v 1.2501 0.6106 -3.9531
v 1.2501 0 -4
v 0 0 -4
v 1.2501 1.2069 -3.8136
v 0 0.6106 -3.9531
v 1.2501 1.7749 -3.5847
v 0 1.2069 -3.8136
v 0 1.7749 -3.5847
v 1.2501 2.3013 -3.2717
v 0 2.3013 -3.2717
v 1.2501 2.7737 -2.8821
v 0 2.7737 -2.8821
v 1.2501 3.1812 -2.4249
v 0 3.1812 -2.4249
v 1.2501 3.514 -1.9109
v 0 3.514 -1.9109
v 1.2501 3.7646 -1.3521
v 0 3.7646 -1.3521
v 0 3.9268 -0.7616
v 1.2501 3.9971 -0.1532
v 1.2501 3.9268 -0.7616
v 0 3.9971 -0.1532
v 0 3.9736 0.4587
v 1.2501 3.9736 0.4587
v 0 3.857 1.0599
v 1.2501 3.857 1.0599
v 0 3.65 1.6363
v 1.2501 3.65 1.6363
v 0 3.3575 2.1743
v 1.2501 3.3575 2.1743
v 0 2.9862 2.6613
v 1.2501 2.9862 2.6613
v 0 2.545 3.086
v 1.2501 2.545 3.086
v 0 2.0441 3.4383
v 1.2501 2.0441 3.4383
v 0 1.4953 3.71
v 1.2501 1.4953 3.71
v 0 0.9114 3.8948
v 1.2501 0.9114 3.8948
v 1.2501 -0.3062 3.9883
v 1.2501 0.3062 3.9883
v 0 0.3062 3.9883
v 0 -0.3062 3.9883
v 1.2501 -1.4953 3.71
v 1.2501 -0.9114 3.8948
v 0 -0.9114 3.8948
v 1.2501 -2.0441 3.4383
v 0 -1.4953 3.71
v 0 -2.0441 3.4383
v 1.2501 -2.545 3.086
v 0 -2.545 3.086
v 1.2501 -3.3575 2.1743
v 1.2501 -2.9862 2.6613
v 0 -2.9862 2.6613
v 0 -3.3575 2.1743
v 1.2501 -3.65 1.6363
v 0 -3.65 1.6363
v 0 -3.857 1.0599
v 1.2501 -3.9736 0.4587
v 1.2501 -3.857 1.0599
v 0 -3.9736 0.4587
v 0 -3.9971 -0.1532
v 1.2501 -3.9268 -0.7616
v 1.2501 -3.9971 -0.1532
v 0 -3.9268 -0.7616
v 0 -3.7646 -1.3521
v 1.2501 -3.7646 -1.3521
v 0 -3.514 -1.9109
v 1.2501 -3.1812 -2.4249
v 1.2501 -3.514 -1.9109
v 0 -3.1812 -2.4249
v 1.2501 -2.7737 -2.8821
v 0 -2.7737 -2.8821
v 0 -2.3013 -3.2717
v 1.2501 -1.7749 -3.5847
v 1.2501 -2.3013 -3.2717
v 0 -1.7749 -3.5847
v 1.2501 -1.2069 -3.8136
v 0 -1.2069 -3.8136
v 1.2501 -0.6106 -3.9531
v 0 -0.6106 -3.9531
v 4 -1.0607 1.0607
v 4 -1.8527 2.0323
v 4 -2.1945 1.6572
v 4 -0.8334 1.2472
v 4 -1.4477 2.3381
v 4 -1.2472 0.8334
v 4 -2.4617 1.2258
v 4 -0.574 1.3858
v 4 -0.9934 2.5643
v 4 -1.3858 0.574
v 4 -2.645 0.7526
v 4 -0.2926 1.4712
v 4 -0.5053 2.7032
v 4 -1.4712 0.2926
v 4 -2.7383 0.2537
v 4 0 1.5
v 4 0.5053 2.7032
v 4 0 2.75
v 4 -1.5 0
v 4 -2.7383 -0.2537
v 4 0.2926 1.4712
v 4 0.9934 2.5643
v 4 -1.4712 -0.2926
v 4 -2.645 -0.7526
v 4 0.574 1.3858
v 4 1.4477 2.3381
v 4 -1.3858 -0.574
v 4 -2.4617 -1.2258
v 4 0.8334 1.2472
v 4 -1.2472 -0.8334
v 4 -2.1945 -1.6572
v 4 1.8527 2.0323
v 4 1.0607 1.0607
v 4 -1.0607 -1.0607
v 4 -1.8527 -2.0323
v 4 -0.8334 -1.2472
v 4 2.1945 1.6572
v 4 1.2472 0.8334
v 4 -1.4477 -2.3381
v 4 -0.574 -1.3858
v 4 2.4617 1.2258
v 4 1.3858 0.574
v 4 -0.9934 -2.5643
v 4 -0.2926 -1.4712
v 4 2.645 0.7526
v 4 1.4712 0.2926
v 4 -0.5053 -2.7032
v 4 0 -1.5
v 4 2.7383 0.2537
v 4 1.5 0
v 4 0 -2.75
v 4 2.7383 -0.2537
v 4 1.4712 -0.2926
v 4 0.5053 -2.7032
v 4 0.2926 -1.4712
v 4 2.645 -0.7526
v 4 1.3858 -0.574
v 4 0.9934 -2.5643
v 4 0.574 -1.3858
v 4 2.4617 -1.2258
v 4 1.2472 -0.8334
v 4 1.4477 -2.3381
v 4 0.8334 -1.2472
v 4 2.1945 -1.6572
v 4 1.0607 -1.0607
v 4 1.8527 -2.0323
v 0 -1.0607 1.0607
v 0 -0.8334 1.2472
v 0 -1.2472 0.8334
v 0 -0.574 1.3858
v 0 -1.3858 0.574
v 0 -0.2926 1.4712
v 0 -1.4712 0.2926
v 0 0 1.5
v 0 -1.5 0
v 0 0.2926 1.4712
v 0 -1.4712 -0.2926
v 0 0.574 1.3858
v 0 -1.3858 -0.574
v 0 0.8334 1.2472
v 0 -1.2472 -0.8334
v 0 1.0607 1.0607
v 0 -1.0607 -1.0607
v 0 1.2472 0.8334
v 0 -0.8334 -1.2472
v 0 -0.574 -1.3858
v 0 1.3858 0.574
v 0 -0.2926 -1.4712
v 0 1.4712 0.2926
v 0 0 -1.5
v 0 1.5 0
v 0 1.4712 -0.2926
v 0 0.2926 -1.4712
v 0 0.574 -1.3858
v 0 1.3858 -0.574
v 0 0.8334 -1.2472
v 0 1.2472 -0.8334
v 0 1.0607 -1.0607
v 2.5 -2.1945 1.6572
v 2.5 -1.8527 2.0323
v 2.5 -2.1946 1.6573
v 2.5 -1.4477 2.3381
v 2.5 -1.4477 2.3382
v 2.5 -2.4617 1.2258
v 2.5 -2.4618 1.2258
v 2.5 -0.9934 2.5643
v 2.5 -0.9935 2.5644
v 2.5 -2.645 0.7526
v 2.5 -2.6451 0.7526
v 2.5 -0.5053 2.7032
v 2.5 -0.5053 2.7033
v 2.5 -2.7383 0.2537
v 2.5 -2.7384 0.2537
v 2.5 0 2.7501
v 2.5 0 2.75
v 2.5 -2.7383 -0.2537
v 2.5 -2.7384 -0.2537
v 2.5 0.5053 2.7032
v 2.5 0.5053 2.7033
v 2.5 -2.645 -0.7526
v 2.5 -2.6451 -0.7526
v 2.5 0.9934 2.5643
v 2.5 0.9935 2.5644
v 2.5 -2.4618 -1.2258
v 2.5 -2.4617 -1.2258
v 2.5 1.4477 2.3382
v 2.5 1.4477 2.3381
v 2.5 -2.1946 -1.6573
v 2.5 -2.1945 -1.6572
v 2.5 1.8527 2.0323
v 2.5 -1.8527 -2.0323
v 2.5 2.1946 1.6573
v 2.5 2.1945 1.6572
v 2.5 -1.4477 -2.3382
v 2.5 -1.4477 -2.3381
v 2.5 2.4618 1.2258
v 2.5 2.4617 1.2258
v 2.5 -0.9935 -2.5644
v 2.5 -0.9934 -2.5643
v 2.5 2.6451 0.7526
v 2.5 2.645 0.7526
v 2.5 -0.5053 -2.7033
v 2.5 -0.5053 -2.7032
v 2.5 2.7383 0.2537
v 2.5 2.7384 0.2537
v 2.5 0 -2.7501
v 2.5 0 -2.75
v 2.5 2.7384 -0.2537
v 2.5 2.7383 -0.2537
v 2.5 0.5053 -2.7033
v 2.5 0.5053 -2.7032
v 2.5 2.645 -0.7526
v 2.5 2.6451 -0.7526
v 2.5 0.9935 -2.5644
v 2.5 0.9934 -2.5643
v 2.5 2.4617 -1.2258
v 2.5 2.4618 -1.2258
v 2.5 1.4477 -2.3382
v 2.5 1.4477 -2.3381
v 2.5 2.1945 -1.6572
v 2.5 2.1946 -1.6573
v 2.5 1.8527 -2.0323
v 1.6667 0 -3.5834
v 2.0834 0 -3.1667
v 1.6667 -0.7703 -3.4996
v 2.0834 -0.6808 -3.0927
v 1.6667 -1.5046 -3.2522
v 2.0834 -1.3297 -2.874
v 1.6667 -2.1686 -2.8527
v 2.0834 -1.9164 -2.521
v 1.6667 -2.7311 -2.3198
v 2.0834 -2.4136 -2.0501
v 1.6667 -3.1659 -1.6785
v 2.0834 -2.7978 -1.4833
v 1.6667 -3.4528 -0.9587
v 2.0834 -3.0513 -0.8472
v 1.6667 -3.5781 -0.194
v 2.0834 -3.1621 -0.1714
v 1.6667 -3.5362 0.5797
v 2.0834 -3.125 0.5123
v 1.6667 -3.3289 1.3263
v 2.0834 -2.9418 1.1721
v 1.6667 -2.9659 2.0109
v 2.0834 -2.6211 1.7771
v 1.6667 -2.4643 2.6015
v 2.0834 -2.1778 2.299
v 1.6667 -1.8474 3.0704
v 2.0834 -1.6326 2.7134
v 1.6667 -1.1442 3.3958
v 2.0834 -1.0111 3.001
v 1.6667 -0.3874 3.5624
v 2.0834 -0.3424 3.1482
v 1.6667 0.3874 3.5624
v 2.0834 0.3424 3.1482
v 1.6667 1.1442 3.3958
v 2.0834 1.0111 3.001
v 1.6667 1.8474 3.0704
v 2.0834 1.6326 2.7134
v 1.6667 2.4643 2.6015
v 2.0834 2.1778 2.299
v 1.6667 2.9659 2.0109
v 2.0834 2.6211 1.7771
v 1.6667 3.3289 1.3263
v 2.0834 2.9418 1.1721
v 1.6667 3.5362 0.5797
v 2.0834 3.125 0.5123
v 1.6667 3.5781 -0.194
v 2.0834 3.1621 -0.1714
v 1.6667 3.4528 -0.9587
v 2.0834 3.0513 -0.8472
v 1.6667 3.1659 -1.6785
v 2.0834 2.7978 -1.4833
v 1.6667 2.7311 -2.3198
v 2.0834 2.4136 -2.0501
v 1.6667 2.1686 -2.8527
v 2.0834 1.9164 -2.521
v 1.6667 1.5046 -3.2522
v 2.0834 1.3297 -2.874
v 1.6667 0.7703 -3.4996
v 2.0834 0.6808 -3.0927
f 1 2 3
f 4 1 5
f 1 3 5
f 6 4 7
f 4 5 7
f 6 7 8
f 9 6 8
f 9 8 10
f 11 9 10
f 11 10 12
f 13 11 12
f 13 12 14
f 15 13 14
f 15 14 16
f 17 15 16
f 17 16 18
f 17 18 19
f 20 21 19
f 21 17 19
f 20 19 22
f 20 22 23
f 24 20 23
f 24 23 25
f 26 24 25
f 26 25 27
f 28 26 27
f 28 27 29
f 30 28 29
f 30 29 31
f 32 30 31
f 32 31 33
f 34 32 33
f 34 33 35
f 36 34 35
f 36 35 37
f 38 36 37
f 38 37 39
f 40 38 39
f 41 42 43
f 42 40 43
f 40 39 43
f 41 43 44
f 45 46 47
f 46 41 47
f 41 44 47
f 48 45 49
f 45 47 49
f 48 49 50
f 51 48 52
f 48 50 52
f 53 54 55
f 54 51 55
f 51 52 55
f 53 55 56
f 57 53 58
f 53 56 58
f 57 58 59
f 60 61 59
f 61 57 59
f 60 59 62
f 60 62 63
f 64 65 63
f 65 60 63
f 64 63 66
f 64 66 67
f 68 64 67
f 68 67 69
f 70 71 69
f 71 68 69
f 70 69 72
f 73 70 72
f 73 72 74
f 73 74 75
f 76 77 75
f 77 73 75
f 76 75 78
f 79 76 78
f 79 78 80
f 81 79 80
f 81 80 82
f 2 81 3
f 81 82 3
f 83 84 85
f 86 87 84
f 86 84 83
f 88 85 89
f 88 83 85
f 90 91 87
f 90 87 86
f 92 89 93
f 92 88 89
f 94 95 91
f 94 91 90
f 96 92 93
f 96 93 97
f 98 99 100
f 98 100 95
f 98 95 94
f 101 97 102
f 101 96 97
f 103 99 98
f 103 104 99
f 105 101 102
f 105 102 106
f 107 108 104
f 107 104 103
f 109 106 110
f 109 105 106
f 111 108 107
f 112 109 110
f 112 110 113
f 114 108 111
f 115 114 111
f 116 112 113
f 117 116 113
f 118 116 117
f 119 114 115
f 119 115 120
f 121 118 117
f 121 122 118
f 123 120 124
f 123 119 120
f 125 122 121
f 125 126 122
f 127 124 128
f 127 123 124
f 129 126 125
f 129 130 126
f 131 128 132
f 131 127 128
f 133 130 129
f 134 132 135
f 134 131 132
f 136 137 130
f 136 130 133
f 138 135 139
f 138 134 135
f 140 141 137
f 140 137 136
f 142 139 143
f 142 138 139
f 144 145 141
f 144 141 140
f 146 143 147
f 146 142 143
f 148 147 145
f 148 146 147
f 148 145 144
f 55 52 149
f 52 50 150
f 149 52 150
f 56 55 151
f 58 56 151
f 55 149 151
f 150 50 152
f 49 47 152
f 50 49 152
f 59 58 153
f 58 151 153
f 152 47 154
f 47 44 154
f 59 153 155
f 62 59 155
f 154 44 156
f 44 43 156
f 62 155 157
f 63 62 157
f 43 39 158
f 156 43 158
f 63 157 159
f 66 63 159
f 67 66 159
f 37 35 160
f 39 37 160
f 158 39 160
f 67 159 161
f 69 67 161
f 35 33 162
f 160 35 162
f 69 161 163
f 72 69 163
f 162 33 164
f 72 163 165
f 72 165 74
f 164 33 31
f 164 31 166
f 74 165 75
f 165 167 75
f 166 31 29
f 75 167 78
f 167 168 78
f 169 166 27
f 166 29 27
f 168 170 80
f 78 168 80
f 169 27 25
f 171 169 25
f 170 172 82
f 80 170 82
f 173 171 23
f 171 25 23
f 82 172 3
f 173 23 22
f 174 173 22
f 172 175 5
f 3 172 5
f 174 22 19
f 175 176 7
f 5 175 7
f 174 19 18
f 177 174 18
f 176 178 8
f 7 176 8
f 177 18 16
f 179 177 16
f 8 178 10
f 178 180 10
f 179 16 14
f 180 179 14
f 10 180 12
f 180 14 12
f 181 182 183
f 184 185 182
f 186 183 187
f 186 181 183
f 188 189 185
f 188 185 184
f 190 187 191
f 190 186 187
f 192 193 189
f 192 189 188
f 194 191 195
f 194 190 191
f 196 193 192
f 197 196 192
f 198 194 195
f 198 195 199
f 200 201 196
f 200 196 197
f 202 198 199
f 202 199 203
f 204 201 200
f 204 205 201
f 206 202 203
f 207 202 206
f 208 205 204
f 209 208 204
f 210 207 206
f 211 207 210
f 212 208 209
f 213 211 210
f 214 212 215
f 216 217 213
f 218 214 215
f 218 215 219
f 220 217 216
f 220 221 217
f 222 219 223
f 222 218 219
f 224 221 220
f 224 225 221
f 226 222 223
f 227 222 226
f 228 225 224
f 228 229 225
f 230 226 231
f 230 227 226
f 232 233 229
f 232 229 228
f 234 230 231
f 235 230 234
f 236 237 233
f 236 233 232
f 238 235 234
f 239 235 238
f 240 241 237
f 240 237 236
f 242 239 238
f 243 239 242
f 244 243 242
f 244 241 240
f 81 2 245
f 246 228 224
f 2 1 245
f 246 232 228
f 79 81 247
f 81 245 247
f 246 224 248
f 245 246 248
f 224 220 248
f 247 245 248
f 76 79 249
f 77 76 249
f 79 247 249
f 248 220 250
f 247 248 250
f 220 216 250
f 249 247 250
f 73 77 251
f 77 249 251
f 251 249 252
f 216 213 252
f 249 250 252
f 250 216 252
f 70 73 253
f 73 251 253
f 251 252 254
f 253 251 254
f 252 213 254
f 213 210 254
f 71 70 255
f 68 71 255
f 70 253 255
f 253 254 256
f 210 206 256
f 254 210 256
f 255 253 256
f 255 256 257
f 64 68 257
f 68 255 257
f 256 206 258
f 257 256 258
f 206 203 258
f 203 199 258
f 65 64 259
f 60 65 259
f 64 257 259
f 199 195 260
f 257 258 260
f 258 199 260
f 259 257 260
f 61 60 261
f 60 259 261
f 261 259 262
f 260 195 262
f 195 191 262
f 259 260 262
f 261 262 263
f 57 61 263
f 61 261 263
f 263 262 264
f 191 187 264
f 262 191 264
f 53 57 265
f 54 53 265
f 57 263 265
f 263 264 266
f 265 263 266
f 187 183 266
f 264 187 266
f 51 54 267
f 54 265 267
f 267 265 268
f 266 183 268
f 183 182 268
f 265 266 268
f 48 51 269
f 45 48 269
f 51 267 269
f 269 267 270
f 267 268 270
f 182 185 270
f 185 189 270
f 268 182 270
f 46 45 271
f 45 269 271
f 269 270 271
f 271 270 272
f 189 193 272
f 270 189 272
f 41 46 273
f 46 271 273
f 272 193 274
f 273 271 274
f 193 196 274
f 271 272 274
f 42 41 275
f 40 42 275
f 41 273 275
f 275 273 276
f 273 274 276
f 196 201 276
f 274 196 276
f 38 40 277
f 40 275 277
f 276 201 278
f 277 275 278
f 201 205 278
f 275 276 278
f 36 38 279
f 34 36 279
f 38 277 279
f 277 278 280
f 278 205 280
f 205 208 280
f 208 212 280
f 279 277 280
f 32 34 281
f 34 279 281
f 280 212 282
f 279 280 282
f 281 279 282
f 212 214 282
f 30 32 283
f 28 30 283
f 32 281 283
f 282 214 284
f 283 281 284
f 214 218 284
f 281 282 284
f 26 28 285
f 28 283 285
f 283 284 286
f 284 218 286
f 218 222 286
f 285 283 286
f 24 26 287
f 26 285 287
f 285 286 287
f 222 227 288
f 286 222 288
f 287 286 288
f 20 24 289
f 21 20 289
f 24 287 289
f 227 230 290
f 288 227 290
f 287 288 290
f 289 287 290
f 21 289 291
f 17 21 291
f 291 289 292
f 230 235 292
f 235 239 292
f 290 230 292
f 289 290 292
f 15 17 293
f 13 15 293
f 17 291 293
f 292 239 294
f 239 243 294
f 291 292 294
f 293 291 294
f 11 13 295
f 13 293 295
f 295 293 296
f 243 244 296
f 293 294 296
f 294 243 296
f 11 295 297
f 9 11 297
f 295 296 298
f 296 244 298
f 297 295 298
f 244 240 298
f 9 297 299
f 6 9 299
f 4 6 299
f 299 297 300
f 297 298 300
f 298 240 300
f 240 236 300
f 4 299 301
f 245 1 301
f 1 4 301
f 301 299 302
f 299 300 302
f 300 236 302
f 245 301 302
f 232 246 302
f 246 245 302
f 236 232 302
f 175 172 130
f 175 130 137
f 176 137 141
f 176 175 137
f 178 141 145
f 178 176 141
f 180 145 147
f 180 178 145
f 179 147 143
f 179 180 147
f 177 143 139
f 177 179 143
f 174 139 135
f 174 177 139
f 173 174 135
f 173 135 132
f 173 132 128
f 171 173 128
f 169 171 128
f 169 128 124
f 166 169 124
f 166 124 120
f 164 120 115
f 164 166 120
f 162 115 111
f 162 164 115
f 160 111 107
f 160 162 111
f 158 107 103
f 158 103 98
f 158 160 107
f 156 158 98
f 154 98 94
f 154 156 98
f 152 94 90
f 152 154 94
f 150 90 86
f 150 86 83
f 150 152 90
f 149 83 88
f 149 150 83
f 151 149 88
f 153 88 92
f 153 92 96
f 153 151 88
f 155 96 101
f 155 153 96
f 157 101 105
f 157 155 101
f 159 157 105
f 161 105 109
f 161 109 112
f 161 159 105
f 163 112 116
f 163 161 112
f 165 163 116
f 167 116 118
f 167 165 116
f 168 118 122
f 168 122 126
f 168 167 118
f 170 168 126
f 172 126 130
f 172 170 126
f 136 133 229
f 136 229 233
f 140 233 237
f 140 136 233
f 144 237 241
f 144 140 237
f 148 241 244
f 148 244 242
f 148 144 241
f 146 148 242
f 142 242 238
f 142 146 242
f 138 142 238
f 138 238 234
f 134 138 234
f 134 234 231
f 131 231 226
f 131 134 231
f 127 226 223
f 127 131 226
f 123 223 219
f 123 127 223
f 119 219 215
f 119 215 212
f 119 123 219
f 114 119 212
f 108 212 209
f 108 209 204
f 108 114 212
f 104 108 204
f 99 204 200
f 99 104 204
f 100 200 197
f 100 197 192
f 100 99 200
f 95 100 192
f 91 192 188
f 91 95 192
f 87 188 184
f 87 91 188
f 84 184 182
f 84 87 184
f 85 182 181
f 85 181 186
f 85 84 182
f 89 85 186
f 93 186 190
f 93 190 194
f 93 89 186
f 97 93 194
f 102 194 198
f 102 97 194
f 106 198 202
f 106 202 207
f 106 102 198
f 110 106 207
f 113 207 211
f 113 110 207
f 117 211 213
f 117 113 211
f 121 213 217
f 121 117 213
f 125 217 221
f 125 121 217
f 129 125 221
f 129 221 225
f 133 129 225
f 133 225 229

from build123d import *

# Parameters (mm, degrees)
SKETCH1_R           = 4
SKETCH1_R_2         = 1.5
BOSS_EXTRUDE1_DEPTH = 4
SKETCH2_OUTSIDE_W   = 12.4
SKETCH2_OUTSIDE_H   = 12.4
SKETCH2_OUTSIDE_R   = 2.75
CUT_EXTRUDE1_DEPTH  = 1.5
CHAMFER1_SIZE       = 1.25


with BuildPart() as part:
    # Sketch1 → Boss-Extrude1 (new body)
    with BuildSketch(Plane(origin=(0, 0, 0), x_dir=(0, 0, -1), z_dir=(1, 0, 0))):
        Circle(SKETCH1_R)
        Circle(SKETCH1_R_2, mode=Mode.SUBTRACT)
    extrude(amount=BOSS_EXTRUDE1_DEPTH)

    # Sketch2 outside → Cut-Extrude1 (cut)
    with BuildSketch(Plane(origin=(4, 0, 0), x_dir=(0, 0, -1), z_dir=(1, 0, 0))):
        Rectangle(SKETCH2_OUTSIDE_W, SKETCH2_OUTSIDE_H)
        Circle(SKETCH2_OUTSIDE_R, mode=Mode.SUBTRACT)
    extrude(amount=-CUT_EXTRUDE1_DEPTH, mode=Mode.SUBTRACT)

    # Chamfer1
    chamfer1_edges = [part.edges().sort_by_distance(p)[0] for p in [
        (2.5, 0, 4),
    ]]
    chamfer(chamfer1_edges, length=CHAMFER1_SIZE - 0.0001)  # a hair under: the kernel refuses the full size


solid = part.part
